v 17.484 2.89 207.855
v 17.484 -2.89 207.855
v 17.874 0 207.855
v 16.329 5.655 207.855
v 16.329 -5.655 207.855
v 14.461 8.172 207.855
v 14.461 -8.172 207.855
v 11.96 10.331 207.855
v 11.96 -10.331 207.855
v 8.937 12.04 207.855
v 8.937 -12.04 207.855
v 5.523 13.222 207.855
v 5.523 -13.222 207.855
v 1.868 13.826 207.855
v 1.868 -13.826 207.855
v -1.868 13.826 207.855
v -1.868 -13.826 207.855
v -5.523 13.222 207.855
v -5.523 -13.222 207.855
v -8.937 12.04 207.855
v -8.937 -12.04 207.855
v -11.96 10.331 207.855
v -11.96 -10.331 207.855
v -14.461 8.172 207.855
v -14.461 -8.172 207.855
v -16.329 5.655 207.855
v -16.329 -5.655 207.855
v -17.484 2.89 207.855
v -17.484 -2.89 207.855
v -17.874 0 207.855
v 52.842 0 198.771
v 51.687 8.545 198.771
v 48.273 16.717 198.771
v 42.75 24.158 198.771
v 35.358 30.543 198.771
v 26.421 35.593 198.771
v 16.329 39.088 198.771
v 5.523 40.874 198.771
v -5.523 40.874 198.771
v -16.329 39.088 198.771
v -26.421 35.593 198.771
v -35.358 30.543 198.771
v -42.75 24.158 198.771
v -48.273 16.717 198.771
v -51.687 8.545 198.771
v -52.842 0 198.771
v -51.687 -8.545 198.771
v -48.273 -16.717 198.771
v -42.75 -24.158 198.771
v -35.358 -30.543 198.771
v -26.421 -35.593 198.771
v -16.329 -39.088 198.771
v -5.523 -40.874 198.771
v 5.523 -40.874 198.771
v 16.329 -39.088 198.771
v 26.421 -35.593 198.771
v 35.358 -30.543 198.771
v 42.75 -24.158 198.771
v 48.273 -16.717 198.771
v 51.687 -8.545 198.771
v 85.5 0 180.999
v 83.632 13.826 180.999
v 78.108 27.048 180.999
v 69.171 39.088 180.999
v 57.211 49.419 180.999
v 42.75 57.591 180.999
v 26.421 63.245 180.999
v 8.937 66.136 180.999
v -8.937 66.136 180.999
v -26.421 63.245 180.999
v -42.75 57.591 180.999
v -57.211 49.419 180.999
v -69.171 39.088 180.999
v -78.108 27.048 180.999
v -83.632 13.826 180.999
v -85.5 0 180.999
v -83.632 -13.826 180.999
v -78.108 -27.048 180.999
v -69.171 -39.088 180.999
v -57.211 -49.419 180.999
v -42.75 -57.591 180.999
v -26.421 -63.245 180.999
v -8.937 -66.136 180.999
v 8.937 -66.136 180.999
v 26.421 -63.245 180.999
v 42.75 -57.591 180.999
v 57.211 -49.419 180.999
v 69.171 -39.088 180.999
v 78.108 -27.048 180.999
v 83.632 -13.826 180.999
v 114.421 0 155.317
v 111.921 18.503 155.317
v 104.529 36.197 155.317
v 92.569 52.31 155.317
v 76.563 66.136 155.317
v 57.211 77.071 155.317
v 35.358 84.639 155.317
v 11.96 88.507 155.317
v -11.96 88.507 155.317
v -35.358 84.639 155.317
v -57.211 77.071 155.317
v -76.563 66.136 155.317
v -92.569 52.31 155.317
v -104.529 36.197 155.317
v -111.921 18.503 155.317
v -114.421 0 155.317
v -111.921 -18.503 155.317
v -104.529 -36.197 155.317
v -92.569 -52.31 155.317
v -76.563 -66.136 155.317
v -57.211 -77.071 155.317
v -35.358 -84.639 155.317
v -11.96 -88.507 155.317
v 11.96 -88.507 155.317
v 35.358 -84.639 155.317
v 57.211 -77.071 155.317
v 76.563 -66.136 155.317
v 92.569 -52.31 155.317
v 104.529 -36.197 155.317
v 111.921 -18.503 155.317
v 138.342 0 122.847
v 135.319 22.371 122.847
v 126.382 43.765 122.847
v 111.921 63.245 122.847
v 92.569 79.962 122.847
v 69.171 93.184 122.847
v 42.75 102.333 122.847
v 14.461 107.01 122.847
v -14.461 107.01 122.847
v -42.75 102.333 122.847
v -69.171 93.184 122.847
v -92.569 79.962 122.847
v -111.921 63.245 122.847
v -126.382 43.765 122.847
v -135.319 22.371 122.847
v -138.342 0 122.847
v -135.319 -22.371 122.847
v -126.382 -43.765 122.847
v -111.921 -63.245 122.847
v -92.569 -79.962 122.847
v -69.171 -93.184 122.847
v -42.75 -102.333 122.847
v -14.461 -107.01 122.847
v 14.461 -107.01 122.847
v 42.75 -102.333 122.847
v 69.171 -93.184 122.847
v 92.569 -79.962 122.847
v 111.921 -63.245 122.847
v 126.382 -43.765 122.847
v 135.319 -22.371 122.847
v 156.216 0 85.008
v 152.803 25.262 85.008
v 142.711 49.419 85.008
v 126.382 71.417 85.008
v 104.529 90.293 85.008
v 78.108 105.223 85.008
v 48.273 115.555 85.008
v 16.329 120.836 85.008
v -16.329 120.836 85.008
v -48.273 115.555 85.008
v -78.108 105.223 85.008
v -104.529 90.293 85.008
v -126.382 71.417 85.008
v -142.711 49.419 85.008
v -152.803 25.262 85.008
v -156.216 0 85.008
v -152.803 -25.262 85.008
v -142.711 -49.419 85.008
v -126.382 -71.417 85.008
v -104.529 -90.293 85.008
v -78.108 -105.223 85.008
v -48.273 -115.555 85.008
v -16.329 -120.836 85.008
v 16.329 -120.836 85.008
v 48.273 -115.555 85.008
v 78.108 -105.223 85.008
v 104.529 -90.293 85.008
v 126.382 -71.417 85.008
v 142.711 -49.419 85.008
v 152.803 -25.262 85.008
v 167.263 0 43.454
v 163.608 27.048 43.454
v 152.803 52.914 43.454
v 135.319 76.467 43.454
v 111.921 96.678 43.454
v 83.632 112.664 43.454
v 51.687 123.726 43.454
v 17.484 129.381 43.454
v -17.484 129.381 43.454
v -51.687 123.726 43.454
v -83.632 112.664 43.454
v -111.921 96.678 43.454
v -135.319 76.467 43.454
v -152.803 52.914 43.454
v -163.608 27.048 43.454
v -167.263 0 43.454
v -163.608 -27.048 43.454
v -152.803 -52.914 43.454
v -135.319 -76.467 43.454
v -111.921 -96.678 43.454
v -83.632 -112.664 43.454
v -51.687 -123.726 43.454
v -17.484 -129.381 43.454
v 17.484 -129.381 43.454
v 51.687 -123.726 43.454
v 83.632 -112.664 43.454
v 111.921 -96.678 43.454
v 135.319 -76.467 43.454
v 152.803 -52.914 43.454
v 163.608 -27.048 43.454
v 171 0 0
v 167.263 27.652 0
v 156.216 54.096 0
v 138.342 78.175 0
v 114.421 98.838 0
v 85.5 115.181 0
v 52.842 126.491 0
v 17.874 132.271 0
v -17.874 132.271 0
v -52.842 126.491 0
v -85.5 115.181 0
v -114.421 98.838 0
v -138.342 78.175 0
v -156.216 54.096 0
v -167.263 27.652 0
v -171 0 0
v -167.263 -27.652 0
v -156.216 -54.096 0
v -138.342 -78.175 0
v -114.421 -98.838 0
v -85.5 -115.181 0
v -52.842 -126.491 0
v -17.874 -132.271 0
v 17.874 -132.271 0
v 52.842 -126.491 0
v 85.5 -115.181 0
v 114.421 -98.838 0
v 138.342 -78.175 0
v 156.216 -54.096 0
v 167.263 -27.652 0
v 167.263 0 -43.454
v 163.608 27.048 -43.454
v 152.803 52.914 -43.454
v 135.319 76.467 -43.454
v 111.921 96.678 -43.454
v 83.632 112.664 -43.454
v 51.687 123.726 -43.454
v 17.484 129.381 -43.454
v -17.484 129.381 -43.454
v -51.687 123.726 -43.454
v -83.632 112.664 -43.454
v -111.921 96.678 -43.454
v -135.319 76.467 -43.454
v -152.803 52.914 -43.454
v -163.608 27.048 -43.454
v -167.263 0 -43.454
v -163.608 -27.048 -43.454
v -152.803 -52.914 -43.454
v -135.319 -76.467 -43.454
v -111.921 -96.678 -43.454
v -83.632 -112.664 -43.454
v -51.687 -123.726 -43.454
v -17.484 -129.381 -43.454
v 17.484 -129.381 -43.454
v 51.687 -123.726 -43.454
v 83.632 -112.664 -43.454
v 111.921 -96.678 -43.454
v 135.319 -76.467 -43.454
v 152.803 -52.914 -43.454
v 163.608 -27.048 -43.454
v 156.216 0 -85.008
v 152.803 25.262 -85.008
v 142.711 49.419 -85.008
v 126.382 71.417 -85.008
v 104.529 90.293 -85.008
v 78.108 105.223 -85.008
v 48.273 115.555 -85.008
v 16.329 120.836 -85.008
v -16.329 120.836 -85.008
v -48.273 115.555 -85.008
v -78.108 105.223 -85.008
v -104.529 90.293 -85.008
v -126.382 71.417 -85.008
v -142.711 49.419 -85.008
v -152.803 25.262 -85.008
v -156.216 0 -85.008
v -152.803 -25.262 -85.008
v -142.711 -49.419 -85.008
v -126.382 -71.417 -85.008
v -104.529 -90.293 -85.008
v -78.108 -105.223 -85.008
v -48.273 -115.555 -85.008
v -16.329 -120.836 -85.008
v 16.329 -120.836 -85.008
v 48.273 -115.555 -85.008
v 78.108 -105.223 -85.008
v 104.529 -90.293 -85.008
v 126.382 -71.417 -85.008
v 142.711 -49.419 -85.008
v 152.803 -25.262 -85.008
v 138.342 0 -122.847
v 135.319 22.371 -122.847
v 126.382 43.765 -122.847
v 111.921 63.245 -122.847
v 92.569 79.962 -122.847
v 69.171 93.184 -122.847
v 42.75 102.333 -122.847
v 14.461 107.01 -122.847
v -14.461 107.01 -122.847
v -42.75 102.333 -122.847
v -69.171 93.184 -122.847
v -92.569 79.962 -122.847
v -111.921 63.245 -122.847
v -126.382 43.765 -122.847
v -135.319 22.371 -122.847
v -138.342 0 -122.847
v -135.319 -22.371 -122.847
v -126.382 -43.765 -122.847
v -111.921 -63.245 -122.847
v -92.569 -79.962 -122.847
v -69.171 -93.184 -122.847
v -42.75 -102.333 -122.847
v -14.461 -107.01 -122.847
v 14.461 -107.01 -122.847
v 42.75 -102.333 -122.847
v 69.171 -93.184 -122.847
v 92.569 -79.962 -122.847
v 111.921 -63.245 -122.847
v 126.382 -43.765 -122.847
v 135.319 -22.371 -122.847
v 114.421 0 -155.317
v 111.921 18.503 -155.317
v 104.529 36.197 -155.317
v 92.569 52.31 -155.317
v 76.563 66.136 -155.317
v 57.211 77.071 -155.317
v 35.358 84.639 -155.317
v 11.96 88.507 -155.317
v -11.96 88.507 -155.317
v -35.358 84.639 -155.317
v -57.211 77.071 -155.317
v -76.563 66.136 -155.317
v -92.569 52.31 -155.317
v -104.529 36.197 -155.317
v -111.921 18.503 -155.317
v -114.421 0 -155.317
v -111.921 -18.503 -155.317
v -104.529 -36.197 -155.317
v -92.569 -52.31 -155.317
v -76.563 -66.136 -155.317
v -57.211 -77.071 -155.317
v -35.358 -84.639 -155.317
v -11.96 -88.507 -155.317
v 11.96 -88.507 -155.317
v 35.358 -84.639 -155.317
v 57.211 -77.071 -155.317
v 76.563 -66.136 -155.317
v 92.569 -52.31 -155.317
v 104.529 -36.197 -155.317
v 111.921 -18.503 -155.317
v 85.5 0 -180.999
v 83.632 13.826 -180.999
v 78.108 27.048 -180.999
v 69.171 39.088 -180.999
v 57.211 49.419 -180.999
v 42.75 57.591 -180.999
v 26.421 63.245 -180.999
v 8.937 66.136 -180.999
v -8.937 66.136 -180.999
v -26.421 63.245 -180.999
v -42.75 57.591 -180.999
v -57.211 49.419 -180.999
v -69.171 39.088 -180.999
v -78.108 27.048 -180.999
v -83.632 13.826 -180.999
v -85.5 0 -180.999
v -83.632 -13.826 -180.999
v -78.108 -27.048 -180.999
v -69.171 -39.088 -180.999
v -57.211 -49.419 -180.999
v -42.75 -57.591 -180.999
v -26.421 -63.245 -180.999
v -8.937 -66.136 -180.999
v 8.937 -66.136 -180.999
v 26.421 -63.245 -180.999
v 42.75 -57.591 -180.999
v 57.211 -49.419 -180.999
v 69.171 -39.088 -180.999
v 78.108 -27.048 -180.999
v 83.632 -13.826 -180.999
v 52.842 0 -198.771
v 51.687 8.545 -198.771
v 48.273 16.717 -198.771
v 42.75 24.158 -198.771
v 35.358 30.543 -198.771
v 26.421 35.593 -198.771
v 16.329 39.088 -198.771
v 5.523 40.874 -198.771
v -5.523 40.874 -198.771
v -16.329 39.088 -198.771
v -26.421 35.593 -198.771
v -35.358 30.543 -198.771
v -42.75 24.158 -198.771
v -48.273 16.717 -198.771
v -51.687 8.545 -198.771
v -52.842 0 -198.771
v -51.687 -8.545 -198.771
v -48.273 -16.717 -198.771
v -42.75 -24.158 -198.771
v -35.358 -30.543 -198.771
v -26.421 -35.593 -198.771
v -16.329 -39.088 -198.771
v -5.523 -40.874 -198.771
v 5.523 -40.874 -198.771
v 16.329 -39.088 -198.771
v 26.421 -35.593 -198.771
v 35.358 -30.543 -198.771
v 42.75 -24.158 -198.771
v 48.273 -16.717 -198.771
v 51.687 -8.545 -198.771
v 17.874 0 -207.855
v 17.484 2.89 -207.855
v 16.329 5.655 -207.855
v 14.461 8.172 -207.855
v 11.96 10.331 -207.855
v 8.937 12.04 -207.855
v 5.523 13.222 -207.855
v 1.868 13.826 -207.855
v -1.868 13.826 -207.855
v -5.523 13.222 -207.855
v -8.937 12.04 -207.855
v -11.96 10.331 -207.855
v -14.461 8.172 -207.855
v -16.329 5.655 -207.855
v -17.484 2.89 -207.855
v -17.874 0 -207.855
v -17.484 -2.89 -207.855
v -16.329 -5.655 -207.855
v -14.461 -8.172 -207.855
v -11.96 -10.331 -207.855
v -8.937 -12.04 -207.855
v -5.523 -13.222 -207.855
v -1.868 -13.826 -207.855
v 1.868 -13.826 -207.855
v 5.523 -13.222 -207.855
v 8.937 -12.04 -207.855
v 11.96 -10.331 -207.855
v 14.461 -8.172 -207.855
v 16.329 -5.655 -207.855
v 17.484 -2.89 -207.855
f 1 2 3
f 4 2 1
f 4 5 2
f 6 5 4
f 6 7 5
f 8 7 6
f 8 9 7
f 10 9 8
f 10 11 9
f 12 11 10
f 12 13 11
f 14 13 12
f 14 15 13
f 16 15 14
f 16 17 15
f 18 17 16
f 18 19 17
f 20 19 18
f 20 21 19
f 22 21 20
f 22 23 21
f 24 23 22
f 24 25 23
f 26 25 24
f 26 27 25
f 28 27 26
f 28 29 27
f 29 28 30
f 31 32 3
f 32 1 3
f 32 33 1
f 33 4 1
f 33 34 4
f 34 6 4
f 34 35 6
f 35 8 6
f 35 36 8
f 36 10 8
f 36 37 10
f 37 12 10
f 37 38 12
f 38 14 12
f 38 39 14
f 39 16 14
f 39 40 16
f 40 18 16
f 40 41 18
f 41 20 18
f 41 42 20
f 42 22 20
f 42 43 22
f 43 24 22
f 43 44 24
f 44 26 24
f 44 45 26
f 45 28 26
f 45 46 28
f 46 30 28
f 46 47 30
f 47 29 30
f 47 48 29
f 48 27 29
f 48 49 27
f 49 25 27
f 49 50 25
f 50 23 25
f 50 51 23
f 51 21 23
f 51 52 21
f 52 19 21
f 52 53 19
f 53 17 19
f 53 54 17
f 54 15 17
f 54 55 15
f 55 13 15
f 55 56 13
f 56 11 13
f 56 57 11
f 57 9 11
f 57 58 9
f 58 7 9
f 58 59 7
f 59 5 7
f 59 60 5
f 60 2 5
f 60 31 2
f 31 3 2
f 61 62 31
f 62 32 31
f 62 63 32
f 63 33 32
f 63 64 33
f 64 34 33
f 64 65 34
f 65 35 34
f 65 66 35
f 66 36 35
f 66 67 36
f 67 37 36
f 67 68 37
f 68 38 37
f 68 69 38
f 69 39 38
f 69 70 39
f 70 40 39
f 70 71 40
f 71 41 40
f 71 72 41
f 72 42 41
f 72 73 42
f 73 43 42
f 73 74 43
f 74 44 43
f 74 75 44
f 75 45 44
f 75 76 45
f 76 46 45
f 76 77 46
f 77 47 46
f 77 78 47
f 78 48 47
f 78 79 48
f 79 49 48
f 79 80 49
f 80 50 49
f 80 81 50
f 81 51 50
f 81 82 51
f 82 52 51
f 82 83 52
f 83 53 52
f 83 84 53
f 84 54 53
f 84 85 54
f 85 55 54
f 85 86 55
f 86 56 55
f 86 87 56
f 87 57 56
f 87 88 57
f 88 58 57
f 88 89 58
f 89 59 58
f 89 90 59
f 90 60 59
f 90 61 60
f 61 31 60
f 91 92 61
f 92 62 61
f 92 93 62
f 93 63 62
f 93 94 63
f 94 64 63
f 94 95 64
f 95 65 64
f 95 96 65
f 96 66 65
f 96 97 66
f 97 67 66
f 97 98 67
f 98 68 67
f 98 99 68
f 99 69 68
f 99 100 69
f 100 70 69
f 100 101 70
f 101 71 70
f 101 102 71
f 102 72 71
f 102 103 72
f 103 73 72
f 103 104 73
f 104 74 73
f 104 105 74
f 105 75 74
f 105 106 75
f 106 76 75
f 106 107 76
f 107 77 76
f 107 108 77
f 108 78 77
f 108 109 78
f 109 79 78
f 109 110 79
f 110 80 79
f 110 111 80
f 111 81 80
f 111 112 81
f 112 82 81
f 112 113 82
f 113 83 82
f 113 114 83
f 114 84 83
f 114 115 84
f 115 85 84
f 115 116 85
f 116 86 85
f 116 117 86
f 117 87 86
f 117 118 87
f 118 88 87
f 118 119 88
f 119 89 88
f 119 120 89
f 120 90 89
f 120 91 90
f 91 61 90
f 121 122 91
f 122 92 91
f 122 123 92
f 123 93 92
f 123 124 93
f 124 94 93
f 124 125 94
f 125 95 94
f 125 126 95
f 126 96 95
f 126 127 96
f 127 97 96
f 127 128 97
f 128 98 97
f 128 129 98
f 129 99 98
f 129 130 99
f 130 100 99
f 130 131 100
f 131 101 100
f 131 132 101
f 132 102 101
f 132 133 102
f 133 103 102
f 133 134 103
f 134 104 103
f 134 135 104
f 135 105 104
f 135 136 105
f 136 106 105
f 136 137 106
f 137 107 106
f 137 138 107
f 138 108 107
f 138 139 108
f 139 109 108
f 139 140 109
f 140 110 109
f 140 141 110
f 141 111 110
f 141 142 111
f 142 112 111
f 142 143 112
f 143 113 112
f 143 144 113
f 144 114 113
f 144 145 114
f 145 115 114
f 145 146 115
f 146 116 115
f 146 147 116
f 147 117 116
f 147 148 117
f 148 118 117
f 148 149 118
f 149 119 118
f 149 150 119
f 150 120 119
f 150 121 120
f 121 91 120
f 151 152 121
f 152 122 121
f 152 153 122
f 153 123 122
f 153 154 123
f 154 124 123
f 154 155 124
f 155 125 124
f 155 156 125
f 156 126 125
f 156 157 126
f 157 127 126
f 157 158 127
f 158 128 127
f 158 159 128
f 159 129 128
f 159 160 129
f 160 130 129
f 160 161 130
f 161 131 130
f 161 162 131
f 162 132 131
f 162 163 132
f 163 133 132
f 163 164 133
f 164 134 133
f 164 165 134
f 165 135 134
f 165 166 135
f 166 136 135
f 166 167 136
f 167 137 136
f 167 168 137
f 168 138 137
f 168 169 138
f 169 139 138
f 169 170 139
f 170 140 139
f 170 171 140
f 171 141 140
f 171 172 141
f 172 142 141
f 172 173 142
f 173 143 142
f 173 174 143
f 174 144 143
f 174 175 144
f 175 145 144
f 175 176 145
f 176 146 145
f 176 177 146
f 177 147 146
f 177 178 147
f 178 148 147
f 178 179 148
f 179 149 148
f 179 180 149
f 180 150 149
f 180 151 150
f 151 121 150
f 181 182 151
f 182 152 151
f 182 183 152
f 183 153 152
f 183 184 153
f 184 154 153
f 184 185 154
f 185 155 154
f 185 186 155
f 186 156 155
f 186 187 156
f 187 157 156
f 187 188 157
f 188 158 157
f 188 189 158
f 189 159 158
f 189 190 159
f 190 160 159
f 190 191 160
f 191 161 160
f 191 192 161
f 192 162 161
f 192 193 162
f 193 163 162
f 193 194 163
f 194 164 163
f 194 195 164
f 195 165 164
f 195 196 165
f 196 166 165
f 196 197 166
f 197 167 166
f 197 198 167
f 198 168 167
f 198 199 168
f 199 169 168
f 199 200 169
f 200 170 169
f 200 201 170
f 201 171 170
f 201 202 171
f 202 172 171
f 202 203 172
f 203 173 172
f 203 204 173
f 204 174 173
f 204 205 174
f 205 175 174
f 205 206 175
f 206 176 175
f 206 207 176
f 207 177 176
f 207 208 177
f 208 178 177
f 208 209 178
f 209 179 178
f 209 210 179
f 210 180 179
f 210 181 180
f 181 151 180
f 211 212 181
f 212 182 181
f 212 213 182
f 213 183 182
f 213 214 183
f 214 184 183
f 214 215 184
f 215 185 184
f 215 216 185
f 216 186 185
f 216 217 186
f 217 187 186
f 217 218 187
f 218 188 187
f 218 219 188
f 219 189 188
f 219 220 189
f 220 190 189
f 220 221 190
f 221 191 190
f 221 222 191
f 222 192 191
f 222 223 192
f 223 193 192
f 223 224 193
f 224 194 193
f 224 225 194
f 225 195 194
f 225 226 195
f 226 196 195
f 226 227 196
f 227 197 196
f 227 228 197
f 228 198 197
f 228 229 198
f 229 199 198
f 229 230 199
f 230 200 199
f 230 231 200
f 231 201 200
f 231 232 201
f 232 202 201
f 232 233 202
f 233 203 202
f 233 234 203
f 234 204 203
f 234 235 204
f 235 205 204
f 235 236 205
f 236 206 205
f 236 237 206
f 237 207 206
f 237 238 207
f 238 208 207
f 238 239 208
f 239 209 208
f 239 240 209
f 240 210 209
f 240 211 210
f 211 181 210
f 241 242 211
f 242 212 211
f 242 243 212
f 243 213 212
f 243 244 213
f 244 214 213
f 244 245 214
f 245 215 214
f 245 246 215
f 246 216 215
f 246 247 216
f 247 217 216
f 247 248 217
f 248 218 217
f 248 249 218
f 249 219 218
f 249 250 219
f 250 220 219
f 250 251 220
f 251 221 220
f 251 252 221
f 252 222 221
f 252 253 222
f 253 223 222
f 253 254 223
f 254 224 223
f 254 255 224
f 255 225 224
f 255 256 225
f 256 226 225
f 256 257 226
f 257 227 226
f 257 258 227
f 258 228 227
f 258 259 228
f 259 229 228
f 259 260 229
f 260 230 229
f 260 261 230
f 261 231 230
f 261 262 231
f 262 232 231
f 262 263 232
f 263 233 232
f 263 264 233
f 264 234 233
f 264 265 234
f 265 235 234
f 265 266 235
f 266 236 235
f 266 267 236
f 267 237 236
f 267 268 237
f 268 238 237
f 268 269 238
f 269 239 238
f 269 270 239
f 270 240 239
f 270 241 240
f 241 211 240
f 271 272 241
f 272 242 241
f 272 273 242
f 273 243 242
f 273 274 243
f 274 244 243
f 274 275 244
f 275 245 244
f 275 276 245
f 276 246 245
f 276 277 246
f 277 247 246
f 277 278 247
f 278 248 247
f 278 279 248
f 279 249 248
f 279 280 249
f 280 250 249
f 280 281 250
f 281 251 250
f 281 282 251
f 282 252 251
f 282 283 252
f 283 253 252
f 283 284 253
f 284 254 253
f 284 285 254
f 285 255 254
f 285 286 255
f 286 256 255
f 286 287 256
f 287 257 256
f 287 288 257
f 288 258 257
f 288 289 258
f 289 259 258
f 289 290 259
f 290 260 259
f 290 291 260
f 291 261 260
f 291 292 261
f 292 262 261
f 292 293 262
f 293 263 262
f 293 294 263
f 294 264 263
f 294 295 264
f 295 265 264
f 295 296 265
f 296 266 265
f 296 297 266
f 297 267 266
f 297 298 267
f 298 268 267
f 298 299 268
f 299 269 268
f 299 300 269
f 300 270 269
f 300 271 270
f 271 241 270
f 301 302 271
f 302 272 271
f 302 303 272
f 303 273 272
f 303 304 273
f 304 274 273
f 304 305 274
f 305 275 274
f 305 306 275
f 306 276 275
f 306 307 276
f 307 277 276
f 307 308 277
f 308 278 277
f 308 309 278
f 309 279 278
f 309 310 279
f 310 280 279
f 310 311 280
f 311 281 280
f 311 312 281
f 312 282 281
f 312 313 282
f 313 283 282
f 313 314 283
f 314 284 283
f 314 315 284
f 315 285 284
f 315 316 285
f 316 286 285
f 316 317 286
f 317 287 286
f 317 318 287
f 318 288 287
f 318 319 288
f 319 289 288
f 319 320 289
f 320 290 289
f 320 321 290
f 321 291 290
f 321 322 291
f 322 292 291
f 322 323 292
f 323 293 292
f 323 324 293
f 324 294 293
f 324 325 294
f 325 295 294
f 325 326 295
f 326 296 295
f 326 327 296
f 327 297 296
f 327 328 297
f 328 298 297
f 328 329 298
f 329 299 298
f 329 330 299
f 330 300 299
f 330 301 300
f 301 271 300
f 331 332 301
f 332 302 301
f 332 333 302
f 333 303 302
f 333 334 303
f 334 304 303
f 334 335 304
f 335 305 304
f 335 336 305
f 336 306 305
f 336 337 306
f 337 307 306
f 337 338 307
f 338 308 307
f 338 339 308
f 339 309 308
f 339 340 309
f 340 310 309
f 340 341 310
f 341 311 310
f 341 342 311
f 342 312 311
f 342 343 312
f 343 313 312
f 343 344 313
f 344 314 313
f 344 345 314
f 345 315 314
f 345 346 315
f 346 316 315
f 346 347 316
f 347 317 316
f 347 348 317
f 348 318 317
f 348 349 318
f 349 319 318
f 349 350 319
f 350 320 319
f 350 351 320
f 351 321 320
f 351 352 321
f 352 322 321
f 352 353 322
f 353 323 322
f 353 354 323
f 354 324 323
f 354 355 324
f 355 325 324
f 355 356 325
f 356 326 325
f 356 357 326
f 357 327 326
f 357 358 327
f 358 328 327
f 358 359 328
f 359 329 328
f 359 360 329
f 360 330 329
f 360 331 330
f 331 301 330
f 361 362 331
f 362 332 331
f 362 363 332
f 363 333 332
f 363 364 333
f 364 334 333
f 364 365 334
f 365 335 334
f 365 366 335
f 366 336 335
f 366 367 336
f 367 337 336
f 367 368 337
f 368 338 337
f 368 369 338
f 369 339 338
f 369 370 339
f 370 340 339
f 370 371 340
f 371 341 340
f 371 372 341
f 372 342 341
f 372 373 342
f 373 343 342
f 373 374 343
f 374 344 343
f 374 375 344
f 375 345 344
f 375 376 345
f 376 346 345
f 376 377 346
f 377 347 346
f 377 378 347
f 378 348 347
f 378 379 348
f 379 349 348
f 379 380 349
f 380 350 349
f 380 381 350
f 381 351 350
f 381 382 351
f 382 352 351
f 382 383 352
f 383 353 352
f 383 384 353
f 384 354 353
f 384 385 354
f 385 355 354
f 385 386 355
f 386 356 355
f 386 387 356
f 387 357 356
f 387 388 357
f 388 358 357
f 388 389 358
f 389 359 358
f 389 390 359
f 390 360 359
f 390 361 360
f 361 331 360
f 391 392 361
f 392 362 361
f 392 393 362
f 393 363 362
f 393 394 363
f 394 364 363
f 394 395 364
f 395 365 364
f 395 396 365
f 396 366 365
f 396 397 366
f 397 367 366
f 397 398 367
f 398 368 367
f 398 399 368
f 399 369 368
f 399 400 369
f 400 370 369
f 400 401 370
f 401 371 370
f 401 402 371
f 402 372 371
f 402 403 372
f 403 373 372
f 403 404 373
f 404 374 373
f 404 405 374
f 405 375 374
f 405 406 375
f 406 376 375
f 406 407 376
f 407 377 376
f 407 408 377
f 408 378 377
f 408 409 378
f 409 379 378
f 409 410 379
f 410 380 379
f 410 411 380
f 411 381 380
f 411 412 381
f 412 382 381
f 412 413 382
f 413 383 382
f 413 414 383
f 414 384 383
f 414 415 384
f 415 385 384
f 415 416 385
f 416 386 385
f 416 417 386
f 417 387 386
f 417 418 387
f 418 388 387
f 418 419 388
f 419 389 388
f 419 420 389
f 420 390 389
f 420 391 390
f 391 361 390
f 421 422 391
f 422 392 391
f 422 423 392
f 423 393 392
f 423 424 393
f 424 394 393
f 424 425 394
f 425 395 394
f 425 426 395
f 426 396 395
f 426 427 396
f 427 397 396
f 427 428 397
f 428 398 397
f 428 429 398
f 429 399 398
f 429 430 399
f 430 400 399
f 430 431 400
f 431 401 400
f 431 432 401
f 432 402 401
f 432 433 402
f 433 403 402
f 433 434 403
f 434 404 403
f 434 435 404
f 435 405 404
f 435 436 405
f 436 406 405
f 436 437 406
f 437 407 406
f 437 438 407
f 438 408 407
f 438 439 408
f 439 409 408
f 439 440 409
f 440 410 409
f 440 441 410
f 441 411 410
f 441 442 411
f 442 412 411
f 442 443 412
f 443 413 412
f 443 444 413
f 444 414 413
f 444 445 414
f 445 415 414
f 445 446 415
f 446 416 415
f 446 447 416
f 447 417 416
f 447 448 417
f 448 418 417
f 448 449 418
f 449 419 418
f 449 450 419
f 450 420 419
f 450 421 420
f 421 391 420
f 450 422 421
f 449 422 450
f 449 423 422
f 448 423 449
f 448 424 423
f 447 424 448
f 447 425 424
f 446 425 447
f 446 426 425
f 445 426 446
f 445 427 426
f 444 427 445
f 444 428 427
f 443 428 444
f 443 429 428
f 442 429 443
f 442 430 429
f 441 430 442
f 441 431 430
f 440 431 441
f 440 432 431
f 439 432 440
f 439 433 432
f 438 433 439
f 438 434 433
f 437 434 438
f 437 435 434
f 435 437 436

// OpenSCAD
// Generated by SolidPython 1.0.1 on 2020-07-29 00:46:48


scale(v = [9, 7, 11]) {
	sphere(r = 19);
}
/***********************************************
*********      SolidPython code:      **********
************************************************
 
# import packages: SolidPython
from solid import *
from solid.utils import *
from itertools import chain, combinations, permutations


class Resize:

    def __init__(self, scad_file):
        self.scad_file = scad_file
        #self.scad_file = import_scad(scad_file)
        # cone/cylinder param:
        self.r1 = 0
        self.r2 = 0
        self.h = 0
        # rectangular prism param:
        self.w = 0
        self.l = 0
        # ellipse param:
        self.r = 0

    # import OpenScad code (file name corresponds to shape)


    # classify shape + parameters
    def assign(self, param1, param2, param3):
        if self.scad_file == 'cone.scad':
            self.r1 = param1
            self.r2 = param2
            self.h = param3
        elif self.scad_file == 'cylinder.scad':
            self.r1 = param1
            self.r2 = param2
            self.h = param3
        elif self.scad_file == 'rectangularPrism.scad':
            self.h = param1
            self.l = param2
            self.w = param3
        else:
            self.r = param1
            self.h = param2

    # resize parameters
    def iterate(self):
        x = range(3, 20, 2)
        i = 1
        if self.scad_file == 'cone.scad':
            tempList = list(permutations(x, 2))
            for temp in tempList:
                param1 = temp[0]
                param2 = temp[1]
                filepath = 'produced_scad_files/' + 'cone' + str(param1) + '_' + str(param2) + '_' + '.scad'
                scad_render_to_file(cylinder(h=param1, r1=param2, r2=0), filepath)

        elif self.scad_file == 'cylinder.scad':
            tempList = list(permutations(x, 3))
            for temp in tempList:
                param1 = temp[0]
                param2 = temp[1]
                filepath = 'produced_scad_files/' + 'cylinder' + str(param1) + '_' + str(param2) + '_' + '.scad'
                scad_render_to_file(cylinder(h=param1, r1=param2, r2=param2), filepath)

        elif self.scad_file == 'rectangularPrism.scad':
            tempList = list(permutations(x, 3))
            for temp in tempList:
                param1 = temp[0]
                param2 = temp[1]
                param3 = temp[2]
                filepath = 'produced_scad_files/' + 'rectangularPrism' + str(param1) + '_' + str(param2) + '_' + str(
                    param3) + '.scad'
                scad_render_to_file(cube(size=(param1, param2, param3)), filepath)

        elif self.scad_file == 'ellipse.scad':
            tempList = list(permutations(x, 4))
            for temp in tempList:
                param1 = temp[0]
                param2 = temp[1]
                param3 = temp[2]
                param4 = temp[3]
                filepath = 'produced_scad_files/' + 'ellipse' + str(param1) + '_' + str(param2) + '_' + str(param3) + '_' + str(param4) + '.scad'
                scad_render_to_file(scale([param1, param2, param3])(sphere(r=param4)), filepath)

    def render_to_scadfile(self):
        scad_render_to_file(scad, 'example.scad') 
 
************************************************/
